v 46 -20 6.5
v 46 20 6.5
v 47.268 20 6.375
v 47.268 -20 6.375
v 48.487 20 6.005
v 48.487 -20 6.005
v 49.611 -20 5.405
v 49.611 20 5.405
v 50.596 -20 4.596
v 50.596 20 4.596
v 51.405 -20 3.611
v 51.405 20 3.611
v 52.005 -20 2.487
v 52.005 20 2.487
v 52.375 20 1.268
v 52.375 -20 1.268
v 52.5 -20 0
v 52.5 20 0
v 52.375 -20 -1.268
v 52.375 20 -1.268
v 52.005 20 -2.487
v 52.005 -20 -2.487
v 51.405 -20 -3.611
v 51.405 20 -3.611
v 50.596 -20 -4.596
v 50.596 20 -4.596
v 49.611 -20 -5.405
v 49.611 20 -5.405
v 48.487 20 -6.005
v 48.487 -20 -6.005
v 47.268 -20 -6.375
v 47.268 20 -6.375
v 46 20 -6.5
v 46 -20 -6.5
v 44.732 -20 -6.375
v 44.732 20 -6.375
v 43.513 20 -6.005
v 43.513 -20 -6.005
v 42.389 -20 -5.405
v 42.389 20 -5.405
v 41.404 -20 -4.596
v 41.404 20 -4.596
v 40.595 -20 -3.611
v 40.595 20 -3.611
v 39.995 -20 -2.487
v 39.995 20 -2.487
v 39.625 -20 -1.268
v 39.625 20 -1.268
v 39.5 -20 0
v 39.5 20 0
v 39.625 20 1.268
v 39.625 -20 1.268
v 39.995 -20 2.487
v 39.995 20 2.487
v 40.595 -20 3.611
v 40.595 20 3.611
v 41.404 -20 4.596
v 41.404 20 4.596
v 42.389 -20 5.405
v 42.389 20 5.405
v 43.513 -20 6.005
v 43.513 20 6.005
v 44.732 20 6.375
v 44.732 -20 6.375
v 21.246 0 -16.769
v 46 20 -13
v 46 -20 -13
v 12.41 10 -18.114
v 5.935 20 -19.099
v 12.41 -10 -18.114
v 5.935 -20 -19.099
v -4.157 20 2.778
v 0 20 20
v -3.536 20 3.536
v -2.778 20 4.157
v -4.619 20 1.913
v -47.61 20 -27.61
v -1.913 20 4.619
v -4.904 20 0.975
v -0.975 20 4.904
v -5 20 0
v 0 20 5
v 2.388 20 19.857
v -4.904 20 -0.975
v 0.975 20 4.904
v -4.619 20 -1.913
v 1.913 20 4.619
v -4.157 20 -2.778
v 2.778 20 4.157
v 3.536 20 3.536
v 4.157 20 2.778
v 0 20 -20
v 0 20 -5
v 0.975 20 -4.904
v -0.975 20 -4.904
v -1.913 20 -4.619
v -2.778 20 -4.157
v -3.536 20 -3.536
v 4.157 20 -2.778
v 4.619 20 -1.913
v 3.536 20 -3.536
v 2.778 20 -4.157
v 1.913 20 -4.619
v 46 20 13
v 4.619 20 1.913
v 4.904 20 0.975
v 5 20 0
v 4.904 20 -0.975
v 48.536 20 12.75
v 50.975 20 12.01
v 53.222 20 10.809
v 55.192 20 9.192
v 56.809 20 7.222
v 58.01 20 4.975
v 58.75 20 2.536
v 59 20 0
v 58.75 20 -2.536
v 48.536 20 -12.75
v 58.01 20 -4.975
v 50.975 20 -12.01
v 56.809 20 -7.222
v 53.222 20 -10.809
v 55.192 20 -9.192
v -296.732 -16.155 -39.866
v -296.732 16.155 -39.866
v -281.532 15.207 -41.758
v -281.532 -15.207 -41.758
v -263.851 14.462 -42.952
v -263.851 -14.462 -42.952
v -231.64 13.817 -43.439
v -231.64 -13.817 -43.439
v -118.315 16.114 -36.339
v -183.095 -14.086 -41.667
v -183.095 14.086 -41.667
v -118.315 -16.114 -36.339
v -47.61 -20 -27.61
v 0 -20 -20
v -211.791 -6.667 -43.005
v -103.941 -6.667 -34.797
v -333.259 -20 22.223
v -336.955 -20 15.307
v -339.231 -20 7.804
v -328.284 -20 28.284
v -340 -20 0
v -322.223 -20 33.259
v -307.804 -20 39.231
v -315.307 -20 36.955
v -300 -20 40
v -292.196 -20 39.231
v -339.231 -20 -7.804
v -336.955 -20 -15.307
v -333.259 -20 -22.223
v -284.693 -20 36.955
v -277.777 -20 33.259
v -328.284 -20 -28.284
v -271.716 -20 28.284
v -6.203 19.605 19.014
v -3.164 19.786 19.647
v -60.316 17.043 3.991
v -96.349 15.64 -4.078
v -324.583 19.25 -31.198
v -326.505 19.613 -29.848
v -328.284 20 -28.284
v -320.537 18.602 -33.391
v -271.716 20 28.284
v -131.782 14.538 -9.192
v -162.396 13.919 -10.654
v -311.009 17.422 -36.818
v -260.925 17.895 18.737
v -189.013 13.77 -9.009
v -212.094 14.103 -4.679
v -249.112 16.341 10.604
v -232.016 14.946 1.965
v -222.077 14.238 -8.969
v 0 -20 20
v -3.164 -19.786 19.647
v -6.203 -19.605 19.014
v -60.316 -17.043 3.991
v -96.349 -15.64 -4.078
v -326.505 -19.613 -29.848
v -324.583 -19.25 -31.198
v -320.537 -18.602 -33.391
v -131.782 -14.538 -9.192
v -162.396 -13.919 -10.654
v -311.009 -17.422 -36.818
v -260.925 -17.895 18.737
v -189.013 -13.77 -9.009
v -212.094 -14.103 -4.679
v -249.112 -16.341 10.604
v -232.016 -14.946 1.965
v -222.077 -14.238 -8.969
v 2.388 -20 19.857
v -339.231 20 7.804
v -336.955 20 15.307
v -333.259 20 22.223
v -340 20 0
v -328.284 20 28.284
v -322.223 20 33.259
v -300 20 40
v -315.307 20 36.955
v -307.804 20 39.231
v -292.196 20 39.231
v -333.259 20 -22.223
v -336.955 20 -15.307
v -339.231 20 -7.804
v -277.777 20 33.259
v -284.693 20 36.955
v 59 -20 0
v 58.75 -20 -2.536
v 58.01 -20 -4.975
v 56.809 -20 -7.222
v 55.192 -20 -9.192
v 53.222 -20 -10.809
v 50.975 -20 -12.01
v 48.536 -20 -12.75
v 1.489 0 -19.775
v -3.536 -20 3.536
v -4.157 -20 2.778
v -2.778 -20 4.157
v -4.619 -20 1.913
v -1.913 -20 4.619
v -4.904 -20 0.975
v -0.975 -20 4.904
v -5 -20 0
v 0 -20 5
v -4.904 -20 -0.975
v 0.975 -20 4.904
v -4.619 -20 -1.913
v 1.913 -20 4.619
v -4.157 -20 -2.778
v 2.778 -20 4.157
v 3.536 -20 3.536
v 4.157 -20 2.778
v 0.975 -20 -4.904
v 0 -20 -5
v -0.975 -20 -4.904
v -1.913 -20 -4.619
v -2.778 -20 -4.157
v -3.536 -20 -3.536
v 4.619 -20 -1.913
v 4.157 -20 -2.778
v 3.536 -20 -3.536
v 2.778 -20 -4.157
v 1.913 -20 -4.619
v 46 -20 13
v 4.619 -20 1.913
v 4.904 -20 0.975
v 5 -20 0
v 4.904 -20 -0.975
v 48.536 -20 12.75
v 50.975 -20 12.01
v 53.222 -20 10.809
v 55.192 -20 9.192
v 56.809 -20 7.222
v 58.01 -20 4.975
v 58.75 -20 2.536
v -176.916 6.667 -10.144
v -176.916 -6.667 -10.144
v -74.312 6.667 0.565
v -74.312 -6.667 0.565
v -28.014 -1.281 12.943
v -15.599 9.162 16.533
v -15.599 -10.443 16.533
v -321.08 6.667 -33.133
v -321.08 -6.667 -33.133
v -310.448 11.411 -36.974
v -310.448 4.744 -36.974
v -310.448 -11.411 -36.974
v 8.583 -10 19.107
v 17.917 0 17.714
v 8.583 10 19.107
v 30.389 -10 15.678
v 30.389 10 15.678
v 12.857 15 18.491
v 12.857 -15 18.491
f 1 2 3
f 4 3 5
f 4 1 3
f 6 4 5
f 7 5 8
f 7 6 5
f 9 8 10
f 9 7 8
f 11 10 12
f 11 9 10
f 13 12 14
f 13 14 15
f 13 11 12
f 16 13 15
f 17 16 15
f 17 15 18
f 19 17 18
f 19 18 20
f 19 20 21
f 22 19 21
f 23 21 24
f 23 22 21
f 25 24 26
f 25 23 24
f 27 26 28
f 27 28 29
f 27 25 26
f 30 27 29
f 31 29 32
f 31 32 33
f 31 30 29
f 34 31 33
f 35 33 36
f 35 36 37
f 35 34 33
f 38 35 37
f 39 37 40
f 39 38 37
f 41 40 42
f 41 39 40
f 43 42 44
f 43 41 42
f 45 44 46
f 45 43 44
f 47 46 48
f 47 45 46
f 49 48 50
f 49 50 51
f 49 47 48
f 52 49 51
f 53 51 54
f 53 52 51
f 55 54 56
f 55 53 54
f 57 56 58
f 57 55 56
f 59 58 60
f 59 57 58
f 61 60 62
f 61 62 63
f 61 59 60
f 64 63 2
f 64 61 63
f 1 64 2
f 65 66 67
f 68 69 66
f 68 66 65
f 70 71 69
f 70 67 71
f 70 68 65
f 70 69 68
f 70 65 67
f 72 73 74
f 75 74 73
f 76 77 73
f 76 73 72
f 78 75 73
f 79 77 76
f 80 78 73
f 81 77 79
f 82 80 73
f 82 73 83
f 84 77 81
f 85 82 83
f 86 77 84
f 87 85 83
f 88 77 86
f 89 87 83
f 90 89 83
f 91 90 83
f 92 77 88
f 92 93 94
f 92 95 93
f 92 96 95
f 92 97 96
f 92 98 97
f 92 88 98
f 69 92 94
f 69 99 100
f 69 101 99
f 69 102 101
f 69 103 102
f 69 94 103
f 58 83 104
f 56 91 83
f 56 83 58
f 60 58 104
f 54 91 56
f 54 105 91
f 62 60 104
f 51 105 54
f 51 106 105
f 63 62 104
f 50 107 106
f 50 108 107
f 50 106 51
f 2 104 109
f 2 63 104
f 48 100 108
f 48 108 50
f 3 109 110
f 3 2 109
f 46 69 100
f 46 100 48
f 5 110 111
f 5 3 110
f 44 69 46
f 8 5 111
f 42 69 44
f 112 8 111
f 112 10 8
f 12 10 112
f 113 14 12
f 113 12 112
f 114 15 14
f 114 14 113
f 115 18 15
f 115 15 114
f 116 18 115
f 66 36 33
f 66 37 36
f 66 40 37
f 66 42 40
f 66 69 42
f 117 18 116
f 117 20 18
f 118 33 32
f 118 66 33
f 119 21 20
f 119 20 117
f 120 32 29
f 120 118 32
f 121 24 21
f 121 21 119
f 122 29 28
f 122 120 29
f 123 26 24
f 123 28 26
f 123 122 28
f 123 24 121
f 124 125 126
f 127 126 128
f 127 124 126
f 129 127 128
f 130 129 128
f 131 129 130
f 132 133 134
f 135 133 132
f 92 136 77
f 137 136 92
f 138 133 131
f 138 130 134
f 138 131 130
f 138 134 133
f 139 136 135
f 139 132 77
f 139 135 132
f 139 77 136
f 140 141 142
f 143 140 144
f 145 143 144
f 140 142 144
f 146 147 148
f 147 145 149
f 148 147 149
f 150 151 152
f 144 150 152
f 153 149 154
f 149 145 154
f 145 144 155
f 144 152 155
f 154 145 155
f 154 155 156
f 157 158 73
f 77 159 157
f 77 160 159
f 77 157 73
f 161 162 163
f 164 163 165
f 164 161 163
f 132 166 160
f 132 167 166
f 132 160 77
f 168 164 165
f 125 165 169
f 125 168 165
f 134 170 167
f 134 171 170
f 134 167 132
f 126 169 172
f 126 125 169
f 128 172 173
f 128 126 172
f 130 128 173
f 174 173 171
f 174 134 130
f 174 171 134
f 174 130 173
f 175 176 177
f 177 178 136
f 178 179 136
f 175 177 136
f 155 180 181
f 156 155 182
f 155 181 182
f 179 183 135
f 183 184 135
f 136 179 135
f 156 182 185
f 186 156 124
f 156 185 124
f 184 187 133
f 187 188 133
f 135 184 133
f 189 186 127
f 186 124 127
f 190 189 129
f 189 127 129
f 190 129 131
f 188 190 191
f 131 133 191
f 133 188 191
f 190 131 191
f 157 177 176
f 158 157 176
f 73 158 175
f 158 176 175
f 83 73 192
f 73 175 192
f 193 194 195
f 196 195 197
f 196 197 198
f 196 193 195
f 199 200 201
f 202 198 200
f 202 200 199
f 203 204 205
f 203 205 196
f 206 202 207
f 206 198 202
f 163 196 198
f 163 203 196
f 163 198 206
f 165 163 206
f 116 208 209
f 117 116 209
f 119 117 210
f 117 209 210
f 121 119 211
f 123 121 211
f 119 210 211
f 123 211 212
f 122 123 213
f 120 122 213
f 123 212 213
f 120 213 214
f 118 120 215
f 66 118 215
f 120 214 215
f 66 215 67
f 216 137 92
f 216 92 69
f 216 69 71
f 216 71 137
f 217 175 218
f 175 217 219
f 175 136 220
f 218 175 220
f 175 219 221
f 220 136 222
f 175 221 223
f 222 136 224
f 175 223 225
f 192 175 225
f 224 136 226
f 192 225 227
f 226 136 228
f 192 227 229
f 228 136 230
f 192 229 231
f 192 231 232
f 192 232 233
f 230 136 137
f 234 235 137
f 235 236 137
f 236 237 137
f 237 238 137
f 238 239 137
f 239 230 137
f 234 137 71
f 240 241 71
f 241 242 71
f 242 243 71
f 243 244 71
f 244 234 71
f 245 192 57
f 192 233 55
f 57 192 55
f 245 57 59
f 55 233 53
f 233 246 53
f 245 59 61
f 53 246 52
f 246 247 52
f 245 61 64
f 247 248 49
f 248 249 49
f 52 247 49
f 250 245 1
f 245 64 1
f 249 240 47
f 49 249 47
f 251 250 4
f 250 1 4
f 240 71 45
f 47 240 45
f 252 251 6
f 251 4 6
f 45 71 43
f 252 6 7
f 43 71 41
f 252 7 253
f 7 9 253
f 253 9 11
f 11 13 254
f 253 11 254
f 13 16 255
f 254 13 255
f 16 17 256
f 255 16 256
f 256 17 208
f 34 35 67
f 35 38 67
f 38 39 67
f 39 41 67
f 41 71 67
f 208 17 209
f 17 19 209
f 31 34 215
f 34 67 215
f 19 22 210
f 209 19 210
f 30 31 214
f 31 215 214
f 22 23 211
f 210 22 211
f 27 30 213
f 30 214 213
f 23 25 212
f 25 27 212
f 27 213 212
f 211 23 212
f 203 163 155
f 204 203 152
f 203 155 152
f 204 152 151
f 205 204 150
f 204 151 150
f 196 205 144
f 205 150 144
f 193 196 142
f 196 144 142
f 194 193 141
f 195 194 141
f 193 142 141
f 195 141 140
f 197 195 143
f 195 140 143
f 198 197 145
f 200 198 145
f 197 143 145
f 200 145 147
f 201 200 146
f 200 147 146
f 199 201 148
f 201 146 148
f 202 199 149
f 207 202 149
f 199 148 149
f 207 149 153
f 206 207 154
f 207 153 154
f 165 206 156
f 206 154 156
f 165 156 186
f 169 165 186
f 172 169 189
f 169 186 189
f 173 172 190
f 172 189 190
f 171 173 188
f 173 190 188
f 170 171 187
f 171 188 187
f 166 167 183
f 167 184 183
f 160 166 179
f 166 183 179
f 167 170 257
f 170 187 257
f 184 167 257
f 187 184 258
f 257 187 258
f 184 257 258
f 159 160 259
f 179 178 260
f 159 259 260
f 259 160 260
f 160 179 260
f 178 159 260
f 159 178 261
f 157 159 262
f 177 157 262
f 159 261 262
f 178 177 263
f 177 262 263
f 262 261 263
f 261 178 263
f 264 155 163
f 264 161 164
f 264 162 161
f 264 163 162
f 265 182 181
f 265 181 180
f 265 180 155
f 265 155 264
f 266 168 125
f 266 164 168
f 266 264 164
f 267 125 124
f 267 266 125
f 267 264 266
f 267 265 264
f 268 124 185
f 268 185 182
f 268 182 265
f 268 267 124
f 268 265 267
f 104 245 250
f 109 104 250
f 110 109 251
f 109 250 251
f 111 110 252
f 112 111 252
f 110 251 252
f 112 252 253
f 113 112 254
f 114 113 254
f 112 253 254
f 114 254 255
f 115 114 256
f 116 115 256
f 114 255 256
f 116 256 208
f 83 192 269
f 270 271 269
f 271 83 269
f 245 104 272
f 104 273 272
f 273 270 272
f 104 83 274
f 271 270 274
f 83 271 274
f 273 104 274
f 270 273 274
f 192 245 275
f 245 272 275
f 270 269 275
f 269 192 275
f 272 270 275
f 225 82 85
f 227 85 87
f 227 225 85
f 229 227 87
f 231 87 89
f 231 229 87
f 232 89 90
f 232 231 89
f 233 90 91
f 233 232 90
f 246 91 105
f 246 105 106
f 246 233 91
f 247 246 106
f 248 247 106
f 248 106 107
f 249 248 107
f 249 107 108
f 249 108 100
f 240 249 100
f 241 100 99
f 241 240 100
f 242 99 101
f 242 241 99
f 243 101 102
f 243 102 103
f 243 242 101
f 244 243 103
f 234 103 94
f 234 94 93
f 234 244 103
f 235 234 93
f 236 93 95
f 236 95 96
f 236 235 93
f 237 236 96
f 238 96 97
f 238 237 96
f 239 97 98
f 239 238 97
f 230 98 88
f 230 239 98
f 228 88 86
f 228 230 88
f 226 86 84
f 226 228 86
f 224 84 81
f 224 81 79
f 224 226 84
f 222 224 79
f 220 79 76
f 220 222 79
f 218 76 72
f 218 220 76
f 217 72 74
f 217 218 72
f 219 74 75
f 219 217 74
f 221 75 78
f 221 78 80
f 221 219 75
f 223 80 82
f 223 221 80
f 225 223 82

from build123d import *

# Parameters (mm, degrees)
BOSS_EXTRUDE1_DEPTH      = 20
BOSS_EXTRUDE1_DEPTH_BACK = 20
SKETCH1_R                = 5
SKETCH1_R_2              = 6.5
CUT_EXTRUDE2_DEPTH       = 343.928564136
CUT_EXTRUDE2_DEPTH_BACK  = 343.928564136


with BuildPart() as part:
    # Sketch1 → Boss-Extrude1 (new, two sides: drawn at the far end of the back side and taken through both)
    with BuildSketch(Plane(origin=(0, 0, 0), x_dir=(1, 0, 0), z_dir=(0, 1, 0)).offset(-BOSS_EXTRUDE1_DEPTH_BACK)):
        with BuildLine():
            ThreePointArc((-328.284271247, 28.284271247), (-328.284271247, -28.284271247), (-271.715728753, -28.284271247))
            add(Edge.make_bspline(
                [(-271.715728753, -28.284271247), (-189.219937614, 54.211519891), (-20, -20), (3.938998468, -20), (19.272331802, -17.666666667), (46, -13)],
                knots=[0, 0, 0, 0, 1, 1, 1.196949923, 1.196949923, 1.196949923, 1.196949923], degree=3))
            ThreePointArc((46, -13), (59, 0), (46, 13))
            add(Edge.make_bspline(
                [(46, 13), (0.03150303, 20), (0, 20)],
                knots=[0.358766717, 0.358766717, 0.358766717, 1.358766717, 1.358766717, 1.358766717], degree=2))
            add(Edge.make_bspline(
                [(0, 20), (-114.873131821, 40.378289836), (-300, 56.568542495), (-328.284271247, 28.284271247)],
                knots=[0.1900067, 0.1900067, 0.1900067, 0.1900067, 1.1900067, 1.1900067, 1.1900067, 1.1900067], degree=3))
        make_face()
        Circle(SKETCH1_R, mode=Mode.SUBTRACT)
        with Locations((46, 0)):
            Circle(SKETCH1_R_2, mode=Mode.SUBTRACT)
    extrude(amount=BOSS_EXTRUDE1_DEPTH + BOSS_EXTRUDE1_DEPTH_BACK)

    # Sketch3 → Cut-Extrude2 (cut, two sides: drawn at the far end of the back side and taken through both)
    with BuildSketch(Plane(origin=(-71.299423149, 0, -172.132034356), x_dir=(0.7071067811865464, 0, -0.7071067811865488), z_dir=(0.7071067811865488, 0, 0.7071067811865464)).offset(-CUT_EXTRUDE2_DEPTH_BACK)):
        with BuildLine():
            add(Edge.make_bspline(
                [(-283.431457505, -20), (-227.543374676, -10.63873359), (-151.71769793, -12.794597658), (-85.441558773, -20)],
                knots=[0, 0, 0, 0, 1, 1, 1, 1], degree=3))
            Line((-283.431457505, -20), (-85.441558773, -20))
        make_face()
        with BuildLine():
            Line((-85.441558773, 20), (-283.431457505, 20))
            add(Edge.make_bspline(
                [(-283.431457505, 20), (-227.543374676, 10.63873359), (-151.71769793, 12.794597658), (-85.441558773, 20)],
                knots=[0, 0, 0, 0, 1, 1, 1, 1], degree=3))
        make_face()
    extrude(amount=CUT_EXTRUDE2_DEPTH + CUT_EXTRUDE2_DEPTH_BACK, mode=Mode.SUBTRACT)


solid = part.part
